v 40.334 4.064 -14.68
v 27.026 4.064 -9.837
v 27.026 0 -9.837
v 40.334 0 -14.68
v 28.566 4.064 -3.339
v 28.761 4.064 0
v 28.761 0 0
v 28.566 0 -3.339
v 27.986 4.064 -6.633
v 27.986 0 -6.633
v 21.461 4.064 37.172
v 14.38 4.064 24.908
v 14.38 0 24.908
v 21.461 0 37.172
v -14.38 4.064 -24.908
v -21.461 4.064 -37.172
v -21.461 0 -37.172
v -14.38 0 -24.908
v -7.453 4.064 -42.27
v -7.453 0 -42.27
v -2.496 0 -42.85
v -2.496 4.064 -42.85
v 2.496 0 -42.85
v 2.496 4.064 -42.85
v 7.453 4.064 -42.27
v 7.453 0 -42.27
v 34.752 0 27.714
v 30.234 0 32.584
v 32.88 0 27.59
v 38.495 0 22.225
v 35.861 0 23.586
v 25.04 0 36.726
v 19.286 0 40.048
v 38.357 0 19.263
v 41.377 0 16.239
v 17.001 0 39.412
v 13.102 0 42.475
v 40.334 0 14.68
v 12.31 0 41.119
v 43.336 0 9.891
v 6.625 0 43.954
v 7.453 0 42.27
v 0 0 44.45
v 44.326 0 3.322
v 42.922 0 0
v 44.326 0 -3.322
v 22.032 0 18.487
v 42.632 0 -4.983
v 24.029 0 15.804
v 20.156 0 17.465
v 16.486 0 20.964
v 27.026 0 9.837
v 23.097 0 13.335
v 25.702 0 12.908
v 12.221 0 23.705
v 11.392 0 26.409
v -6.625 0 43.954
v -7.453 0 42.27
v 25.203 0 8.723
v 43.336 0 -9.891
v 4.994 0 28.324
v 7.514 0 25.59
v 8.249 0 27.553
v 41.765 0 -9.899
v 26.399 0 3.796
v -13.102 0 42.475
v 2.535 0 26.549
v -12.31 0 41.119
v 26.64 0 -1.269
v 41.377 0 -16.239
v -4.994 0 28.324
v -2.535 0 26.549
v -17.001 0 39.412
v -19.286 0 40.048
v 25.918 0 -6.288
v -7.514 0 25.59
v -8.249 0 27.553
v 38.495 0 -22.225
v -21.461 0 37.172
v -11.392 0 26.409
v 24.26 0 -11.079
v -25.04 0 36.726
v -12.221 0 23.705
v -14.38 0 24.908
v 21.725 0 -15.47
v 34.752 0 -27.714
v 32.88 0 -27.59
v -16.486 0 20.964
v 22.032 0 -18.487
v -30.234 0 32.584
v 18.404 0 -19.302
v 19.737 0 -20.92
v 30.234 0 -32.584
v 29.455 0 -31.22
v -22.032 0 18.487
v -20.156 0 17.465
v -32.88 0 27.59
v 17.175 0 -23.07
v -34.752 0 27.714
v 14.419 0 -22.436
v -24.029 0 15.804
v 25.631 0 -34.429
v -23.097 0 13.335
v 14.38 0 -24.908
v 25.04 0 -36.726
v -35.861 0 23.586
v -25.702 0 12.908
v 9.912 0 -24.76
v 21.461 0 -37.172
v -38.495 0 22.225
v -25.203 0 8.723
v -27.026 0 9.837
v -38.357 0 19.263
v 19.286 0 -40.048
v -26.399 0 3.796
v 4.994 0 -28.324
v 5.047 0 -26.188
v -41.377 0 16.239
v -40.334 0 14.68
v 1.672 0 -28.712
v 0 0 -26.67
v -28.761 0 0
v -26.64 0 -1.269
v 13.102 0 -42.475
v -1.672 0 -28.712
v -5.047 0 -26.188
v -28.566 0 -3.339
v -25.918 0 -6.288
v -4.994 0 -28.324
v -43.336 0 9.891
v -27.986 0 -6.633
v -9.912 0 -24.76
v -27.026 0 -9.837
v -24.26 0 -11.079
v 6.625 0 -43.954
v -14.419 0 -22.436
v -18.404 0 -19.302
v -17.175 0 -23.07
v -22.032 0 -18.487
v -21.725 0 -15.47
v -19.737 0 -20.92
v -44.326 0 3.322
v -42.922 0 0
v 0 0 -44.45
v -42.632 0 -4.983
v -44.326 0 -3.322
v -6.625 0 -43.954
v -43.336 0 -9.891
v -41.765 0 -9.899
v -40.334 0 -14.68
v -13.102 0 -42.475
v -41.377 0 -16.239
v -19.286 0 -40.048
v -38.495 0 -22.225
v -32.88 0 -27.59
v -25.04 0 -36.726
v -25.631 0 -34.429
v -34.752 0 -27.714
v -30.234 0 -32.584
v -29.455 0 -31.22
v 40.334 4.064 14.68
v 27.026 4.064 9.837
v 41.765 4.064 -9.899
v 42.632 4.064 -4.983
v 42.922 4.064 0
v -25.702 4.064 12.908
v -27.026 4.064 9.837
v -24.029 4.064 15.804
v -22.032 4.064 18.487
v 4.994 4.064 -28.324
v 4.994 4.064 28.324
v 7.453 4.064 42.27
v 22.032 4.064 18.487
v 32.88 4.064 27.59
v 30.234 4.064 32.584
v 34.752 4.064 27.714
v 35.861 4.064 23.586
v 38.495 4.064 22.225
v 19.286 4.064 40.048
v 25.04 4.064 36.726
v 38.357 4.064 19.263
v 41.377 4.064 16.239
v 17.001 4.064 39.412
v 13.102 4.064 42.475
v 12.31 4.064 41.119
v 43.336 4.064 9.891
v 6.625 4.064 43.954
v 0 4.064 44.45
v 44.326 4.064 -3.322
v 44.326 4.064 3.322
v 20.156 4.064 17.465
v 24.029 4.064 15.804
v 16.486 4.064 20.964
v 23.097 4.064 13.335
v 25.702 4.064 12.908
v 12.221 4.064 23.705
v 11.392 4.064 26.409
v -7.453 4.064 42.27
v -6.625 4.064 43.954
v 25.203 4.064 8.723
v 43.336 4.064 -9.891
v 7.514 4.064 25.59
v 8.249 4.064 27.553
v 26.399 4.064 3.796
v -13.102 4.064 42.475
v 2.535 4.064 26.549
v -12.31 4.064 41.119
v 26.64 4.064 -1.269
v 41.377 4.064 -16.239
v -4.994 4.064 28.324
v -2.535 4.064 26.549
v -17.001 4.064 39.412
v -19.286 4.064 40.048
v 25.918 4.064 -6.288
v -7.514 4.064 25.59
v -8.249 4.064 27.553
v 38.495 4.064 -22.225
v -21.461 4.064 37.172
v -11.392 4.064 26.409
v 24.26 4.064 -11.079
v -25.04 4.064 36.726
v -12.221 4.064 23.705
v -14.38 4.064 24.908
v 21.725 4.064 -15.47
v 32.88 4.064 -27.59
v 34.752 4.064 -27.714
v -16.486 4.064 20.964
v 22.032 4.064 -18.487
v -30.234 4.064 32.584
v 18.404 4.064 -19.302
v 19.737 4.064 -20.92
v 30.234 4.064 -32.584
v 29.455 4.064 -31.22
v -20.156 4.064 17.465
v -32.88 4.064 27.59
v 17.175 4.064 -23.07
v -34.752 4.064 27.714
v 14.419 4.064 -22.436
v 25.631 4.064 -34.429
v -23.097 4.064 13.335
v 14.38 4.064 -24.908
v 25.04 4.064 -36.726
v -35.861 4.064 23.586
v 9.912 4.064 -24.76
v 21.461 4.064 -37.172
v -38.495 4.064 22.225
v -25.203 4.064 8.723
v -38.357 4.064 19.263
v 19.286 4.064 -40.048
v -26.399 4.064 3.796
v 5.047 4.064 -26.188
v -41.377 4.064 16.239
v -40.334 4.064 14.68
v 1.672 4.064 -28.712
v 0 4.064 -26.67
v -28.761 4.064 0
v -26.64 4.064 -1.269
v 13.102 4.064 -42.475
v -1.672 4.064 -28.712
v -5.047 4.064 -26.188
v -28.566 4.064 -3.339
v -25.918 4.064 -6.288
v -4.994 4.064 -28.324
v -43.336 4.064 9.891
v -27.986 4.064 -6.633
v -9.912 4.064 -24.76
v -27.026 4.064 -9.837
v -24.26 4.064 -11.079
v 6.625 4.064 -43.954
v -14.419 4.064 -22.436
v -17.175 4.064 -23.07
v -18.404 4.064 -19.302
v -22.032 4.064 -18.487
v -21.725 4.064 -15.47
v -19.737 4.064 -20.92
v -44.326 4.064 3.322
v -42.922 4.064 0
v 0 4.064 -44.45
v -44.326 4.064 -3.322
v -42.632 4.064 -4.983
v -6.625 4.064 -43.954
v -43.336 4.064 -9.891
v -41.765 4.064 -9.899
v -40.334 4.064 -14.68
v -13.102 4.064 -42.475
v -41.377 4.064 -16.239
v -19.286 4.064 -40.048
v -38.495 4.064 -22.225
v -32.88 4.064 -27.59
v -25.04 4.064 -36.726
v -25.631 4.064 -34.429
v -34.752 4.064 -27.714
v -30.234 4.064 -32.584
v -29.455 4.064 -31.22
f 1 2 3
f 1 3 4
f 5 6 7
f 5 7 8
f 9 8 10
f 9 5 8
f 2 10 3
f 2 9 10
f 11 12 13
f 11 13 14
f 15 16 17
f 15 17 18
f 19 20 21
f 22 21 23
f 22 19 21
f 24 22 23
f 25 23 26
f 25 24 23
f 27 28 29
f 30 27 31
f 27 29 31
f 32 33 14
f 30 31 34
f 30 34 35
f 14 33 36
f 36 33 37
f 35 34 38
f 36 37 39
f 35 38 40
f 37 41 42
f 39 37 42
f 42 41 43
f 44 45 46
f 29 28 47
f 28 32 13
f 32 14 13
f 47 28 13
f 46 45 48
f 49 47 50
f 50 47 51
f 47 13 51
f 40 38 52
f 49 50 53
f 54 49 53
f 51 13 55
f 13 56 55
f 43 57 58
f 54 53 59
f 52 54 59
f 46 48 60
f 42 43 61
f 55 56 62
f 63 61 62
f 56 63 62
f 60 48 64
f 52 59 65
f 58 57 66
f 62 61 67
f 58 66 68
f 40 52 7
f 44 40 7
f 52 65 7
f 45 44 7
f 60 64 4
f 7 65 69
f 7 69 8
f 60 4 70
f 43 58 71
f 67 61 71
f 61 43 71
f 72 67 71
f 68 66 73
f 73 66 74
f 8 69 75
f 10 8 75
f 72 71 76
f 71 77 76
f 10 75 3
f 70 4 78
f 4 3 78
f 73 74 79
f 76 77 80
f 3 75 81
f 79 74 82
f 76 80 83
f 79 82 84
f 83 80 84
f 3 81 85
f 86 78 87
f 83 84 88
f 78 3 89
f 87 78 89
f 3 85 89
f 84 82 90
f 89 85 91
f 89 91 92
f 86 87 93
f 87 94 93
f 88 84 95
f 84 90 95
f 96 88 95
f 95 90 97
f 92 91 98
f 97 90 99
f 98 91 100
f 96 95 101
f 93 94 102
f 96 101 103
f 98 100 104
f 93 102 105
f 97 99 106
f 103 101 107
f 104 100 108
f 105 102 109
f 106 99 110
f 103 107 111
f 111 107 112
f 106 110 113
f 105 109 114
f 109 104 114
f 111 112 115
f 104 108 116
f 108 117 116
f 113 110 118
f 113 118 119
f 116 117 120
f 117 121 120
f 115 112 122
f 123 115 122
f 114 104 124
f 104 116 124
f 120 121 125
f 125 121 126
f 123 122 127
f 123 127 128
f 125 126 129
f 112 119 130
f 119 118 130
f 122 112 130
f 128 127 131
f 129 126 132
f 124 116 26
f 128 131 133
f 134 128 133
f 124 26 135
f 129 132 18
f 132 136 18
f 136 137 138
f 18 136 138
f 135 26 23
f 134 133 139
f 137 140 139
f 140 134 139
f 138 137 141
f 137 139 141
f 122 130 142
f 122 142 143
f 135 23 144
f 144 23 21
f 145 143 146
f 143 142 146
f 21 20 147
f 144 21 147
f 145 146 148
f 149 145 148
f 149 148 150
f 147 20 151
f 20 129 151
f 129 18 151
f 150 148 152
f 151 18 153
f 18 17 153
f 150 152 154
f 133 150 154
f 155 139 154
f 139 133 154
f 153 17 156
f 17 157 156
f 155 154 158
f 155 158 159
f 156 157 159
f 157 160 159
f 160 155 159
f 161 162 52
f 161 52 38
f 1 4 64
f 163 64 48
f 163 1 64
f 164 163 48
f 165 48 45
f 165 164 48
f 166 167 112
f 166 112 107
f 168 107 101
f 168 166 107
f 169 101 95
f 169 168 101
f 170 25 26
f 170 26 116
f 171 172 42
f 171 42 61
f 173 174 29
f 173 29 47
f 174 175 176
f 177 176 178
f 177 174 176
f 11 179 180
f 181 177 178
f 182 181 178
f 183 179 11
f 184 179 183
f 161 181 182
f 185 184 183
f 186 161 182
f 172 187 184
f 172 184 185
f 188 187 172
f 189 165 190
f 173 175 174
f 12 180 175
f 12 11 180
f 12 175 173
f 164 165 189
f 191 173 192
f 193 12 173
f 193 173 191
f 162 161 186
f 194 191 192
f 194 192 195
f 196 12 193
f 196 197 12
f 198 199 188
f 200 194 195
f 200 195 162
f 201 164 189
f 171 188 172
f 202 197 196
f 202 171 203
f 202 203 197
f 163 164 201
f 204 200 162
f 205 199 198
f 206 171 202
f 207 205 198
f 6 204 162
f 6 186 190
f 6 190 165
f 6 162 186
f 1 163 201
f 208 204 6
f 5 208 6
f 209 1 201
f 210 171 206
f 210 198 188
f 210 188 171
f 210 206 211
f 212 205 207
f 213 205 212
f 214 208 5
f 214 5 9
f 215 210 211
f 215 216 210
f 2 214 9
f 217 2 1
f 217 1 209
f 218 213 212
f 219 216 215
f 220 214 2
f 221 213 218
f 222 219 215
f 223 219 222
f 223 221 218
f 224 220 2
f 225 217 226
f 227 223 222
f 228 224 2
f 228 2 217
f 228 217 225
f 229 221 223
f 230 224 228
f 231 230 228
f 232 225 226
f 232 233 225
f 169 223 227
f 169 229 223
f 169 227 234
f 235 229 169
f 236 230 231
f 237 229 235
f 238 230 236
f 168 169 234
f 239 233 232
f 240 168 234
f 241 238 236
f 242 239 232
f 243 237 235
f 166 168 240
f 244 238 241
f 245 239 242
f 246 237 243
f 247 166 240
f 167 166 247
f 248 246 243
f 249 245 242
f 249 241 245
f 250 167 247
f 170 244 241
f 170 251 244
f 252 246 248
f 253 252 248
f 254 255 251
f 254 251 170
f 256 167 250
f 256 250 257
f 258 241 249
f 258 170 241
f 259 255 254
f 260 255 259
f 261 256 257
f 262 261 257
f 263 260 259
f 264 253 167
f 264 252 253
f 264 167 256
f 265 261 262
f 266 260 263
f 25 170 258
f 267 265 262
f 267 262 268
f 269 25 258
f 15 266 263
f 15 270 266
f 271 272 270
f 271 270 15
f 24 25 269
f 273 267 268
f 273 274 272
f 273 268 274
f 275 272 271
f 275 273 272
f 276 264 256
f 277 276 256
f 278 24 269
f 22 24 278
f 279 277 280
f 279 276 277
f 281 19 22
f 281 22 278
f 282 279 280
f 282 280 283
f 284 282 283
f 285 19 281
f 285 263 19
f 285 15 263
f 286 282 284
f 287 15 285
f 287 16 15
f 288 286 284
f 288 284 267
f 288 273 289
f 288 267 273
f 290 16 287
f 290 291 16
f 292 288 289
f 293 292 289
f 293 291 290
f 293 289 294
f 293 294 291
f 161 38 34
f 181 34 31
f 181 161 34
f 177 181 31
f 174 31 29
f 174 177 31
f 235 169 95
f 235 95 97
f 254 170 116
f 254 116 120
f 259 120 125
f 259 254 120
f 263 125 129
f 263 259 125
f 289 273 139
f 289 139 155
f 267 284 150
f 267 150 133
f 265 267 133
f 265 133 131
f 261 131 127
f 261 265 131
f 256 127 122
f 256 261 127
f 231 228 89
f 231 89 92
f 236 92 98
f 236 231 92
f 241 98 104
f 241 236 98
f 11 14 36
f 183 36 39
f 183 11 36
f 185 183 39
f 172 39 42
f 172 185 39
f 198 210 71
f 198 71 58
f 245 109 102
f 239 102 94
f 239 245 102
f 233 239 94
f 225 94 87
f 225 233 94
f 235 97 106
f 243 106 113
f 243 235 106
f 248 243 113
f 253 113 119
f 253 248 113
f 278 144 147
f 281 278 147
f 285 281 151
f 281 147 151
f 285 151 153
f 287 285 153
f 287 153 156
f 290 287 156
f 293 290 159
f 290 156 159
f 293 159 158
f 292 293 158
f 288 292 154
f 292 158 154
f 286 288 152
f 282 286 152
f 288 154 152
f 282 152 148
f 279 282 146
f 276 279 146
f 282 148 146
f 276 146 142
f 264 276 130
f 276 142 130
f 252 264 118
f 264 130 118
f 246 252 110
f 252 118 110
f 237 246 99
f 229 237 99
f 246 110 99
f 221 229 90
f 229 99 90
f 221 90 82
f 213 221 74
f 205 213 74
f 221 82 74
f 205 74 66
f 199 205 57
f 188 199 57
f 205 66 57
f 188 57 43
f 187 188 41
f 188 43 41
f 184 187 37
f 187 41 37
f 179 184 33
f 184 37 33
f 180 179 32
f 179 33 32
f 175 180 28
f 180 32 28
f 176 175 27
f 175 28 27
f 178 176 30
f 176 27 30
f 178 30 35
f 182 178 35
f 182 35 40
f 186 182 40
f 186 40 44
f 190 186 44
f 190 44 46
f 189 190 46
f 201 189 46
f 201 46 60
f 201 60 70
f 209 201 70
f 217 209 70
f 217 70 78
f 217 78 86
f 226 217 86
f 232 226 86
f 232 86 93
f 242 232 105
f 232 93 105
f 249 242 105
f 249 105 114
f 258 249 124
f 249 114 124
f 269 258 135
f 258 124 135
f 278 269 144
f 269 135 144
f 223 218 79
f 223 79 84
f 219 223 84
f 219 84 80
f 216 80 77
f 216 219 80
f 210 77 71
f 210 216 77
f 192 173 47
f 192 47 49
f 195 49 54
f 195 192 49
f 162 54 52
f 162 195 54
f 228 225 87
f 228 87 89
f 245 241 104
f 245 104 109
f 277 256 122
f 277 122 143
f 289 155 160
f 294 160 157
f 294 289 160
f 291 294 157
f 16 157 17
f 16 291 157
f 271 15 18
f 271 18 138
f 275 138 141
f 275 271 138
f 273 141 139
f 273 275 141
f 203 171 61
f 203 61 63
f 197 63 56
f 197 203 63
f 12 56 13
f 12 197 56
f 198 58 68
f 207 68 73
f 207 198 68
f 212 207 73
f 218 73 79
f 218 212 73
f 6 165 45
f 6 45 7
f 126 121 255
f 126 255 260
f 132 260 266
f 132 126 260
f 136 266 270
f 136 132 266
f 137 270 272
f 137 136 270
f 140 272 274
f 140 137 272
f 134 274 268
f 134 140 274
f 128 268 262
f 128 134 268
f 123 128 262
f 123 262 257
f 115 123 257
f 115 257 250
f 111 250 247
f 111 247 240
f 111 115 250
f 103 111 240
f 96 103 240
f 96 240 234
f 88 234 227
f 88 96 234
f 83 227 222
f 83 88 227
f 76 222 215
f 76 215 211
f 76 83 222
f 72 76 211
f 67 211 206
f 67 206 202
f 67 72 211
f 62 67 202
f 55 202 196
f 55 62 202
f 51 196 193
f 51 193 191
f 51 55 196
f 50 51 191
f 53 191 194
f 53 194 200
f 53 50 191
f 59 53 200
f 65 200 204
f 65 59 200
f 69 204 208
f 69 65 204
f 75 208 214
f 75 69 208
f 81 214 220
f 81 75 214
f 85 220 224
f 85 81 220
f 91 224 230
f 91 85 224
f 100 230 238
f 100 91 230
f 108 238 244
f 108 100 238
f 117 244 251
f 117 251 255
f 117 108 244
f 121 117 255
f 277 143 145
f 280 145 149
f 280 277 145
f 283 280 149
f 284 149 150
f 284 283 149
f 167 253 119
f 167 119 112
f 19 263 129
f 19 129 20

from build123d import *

# Parameters (mm, degrees)
SKETCH1_R           = 44.45
SKETCH1_R_2         = 26.67
BOSS_EXTRUDE1_DEPTH = 4.064
CUT_EXTRUDE1_REACH  = 64.993
CIRPATTERN1_COUNT   = 9


with BuildPart() as part:
    # Sketch1 → Boss-Extrude1 (new body)
    with BuildSketch(Plane(origin=(0, 0, 0), x_dir=(1, 0, 0), z_dir=(0, 1, 0))):
        with Locations(Location((0, 0, 0), (0, 0, 90))):
            Circle(SKETCH1_R)
        with Locations(Location((0, 0, 0), (0, 0, 90))):
            Circle(SKETCH1_R_2, mode=Mode.SUBTRACT)
    extrude(amount=BOSS_EXTRUDE1_DEPTH)

    # Sketch2 → Cut-Extrude1 (cut, up to next)
    with BuildSketch(Plane(origin=(0, 4.064, 0), x_dir=(1, 0, 0), z_dir=(0, 1, 0)), mode=Mode.PRIVATE) as cut_extrude1_sk1:
        with BuildLine():
            Line((-28.760847548, 0), (-42.922177943, 0))
            ThreePointArc((-42.922177943, 0), (-42.270093615, 7.453357981), (-40.333653882, 14.680249452))
            Line((-40.333653882, 14.680249452), (-27.026356208, 9.8367892))
            ThreePointArc((-27.026356208, 9.8367892), (-28.323905648, 4.994268765), (-28.760847548, 0))
        make_face()
    cut_extrude1_tool1 = extrude(cut_extrude1_sk1.sketch, amount=-CUT_EXTRUDE1_REACH, mode=Mode.PRIVATE) & part.part
    cut_extrude1 = cut_extrude1_tool1.solids().sort_by_distance((-35.574933, 4.064, -6.27282))[0]
    add(cut_extrude1, mode=Mode.SUBTRACT)

    # CirPattern1: Cut-Extrude1 ×9 about axis
    cirpattern1_axis = Axis((0, 0, 0), (0, 1, 0))
    for i in range(1, CIRPATTERN1_COUNT):
        add(cut_extrude1.rotate(cirpattern1_axis, i * 360 / CIRPATTERN1_COUNT), mode=Mode.SUBTRACT)


solid = part.part
